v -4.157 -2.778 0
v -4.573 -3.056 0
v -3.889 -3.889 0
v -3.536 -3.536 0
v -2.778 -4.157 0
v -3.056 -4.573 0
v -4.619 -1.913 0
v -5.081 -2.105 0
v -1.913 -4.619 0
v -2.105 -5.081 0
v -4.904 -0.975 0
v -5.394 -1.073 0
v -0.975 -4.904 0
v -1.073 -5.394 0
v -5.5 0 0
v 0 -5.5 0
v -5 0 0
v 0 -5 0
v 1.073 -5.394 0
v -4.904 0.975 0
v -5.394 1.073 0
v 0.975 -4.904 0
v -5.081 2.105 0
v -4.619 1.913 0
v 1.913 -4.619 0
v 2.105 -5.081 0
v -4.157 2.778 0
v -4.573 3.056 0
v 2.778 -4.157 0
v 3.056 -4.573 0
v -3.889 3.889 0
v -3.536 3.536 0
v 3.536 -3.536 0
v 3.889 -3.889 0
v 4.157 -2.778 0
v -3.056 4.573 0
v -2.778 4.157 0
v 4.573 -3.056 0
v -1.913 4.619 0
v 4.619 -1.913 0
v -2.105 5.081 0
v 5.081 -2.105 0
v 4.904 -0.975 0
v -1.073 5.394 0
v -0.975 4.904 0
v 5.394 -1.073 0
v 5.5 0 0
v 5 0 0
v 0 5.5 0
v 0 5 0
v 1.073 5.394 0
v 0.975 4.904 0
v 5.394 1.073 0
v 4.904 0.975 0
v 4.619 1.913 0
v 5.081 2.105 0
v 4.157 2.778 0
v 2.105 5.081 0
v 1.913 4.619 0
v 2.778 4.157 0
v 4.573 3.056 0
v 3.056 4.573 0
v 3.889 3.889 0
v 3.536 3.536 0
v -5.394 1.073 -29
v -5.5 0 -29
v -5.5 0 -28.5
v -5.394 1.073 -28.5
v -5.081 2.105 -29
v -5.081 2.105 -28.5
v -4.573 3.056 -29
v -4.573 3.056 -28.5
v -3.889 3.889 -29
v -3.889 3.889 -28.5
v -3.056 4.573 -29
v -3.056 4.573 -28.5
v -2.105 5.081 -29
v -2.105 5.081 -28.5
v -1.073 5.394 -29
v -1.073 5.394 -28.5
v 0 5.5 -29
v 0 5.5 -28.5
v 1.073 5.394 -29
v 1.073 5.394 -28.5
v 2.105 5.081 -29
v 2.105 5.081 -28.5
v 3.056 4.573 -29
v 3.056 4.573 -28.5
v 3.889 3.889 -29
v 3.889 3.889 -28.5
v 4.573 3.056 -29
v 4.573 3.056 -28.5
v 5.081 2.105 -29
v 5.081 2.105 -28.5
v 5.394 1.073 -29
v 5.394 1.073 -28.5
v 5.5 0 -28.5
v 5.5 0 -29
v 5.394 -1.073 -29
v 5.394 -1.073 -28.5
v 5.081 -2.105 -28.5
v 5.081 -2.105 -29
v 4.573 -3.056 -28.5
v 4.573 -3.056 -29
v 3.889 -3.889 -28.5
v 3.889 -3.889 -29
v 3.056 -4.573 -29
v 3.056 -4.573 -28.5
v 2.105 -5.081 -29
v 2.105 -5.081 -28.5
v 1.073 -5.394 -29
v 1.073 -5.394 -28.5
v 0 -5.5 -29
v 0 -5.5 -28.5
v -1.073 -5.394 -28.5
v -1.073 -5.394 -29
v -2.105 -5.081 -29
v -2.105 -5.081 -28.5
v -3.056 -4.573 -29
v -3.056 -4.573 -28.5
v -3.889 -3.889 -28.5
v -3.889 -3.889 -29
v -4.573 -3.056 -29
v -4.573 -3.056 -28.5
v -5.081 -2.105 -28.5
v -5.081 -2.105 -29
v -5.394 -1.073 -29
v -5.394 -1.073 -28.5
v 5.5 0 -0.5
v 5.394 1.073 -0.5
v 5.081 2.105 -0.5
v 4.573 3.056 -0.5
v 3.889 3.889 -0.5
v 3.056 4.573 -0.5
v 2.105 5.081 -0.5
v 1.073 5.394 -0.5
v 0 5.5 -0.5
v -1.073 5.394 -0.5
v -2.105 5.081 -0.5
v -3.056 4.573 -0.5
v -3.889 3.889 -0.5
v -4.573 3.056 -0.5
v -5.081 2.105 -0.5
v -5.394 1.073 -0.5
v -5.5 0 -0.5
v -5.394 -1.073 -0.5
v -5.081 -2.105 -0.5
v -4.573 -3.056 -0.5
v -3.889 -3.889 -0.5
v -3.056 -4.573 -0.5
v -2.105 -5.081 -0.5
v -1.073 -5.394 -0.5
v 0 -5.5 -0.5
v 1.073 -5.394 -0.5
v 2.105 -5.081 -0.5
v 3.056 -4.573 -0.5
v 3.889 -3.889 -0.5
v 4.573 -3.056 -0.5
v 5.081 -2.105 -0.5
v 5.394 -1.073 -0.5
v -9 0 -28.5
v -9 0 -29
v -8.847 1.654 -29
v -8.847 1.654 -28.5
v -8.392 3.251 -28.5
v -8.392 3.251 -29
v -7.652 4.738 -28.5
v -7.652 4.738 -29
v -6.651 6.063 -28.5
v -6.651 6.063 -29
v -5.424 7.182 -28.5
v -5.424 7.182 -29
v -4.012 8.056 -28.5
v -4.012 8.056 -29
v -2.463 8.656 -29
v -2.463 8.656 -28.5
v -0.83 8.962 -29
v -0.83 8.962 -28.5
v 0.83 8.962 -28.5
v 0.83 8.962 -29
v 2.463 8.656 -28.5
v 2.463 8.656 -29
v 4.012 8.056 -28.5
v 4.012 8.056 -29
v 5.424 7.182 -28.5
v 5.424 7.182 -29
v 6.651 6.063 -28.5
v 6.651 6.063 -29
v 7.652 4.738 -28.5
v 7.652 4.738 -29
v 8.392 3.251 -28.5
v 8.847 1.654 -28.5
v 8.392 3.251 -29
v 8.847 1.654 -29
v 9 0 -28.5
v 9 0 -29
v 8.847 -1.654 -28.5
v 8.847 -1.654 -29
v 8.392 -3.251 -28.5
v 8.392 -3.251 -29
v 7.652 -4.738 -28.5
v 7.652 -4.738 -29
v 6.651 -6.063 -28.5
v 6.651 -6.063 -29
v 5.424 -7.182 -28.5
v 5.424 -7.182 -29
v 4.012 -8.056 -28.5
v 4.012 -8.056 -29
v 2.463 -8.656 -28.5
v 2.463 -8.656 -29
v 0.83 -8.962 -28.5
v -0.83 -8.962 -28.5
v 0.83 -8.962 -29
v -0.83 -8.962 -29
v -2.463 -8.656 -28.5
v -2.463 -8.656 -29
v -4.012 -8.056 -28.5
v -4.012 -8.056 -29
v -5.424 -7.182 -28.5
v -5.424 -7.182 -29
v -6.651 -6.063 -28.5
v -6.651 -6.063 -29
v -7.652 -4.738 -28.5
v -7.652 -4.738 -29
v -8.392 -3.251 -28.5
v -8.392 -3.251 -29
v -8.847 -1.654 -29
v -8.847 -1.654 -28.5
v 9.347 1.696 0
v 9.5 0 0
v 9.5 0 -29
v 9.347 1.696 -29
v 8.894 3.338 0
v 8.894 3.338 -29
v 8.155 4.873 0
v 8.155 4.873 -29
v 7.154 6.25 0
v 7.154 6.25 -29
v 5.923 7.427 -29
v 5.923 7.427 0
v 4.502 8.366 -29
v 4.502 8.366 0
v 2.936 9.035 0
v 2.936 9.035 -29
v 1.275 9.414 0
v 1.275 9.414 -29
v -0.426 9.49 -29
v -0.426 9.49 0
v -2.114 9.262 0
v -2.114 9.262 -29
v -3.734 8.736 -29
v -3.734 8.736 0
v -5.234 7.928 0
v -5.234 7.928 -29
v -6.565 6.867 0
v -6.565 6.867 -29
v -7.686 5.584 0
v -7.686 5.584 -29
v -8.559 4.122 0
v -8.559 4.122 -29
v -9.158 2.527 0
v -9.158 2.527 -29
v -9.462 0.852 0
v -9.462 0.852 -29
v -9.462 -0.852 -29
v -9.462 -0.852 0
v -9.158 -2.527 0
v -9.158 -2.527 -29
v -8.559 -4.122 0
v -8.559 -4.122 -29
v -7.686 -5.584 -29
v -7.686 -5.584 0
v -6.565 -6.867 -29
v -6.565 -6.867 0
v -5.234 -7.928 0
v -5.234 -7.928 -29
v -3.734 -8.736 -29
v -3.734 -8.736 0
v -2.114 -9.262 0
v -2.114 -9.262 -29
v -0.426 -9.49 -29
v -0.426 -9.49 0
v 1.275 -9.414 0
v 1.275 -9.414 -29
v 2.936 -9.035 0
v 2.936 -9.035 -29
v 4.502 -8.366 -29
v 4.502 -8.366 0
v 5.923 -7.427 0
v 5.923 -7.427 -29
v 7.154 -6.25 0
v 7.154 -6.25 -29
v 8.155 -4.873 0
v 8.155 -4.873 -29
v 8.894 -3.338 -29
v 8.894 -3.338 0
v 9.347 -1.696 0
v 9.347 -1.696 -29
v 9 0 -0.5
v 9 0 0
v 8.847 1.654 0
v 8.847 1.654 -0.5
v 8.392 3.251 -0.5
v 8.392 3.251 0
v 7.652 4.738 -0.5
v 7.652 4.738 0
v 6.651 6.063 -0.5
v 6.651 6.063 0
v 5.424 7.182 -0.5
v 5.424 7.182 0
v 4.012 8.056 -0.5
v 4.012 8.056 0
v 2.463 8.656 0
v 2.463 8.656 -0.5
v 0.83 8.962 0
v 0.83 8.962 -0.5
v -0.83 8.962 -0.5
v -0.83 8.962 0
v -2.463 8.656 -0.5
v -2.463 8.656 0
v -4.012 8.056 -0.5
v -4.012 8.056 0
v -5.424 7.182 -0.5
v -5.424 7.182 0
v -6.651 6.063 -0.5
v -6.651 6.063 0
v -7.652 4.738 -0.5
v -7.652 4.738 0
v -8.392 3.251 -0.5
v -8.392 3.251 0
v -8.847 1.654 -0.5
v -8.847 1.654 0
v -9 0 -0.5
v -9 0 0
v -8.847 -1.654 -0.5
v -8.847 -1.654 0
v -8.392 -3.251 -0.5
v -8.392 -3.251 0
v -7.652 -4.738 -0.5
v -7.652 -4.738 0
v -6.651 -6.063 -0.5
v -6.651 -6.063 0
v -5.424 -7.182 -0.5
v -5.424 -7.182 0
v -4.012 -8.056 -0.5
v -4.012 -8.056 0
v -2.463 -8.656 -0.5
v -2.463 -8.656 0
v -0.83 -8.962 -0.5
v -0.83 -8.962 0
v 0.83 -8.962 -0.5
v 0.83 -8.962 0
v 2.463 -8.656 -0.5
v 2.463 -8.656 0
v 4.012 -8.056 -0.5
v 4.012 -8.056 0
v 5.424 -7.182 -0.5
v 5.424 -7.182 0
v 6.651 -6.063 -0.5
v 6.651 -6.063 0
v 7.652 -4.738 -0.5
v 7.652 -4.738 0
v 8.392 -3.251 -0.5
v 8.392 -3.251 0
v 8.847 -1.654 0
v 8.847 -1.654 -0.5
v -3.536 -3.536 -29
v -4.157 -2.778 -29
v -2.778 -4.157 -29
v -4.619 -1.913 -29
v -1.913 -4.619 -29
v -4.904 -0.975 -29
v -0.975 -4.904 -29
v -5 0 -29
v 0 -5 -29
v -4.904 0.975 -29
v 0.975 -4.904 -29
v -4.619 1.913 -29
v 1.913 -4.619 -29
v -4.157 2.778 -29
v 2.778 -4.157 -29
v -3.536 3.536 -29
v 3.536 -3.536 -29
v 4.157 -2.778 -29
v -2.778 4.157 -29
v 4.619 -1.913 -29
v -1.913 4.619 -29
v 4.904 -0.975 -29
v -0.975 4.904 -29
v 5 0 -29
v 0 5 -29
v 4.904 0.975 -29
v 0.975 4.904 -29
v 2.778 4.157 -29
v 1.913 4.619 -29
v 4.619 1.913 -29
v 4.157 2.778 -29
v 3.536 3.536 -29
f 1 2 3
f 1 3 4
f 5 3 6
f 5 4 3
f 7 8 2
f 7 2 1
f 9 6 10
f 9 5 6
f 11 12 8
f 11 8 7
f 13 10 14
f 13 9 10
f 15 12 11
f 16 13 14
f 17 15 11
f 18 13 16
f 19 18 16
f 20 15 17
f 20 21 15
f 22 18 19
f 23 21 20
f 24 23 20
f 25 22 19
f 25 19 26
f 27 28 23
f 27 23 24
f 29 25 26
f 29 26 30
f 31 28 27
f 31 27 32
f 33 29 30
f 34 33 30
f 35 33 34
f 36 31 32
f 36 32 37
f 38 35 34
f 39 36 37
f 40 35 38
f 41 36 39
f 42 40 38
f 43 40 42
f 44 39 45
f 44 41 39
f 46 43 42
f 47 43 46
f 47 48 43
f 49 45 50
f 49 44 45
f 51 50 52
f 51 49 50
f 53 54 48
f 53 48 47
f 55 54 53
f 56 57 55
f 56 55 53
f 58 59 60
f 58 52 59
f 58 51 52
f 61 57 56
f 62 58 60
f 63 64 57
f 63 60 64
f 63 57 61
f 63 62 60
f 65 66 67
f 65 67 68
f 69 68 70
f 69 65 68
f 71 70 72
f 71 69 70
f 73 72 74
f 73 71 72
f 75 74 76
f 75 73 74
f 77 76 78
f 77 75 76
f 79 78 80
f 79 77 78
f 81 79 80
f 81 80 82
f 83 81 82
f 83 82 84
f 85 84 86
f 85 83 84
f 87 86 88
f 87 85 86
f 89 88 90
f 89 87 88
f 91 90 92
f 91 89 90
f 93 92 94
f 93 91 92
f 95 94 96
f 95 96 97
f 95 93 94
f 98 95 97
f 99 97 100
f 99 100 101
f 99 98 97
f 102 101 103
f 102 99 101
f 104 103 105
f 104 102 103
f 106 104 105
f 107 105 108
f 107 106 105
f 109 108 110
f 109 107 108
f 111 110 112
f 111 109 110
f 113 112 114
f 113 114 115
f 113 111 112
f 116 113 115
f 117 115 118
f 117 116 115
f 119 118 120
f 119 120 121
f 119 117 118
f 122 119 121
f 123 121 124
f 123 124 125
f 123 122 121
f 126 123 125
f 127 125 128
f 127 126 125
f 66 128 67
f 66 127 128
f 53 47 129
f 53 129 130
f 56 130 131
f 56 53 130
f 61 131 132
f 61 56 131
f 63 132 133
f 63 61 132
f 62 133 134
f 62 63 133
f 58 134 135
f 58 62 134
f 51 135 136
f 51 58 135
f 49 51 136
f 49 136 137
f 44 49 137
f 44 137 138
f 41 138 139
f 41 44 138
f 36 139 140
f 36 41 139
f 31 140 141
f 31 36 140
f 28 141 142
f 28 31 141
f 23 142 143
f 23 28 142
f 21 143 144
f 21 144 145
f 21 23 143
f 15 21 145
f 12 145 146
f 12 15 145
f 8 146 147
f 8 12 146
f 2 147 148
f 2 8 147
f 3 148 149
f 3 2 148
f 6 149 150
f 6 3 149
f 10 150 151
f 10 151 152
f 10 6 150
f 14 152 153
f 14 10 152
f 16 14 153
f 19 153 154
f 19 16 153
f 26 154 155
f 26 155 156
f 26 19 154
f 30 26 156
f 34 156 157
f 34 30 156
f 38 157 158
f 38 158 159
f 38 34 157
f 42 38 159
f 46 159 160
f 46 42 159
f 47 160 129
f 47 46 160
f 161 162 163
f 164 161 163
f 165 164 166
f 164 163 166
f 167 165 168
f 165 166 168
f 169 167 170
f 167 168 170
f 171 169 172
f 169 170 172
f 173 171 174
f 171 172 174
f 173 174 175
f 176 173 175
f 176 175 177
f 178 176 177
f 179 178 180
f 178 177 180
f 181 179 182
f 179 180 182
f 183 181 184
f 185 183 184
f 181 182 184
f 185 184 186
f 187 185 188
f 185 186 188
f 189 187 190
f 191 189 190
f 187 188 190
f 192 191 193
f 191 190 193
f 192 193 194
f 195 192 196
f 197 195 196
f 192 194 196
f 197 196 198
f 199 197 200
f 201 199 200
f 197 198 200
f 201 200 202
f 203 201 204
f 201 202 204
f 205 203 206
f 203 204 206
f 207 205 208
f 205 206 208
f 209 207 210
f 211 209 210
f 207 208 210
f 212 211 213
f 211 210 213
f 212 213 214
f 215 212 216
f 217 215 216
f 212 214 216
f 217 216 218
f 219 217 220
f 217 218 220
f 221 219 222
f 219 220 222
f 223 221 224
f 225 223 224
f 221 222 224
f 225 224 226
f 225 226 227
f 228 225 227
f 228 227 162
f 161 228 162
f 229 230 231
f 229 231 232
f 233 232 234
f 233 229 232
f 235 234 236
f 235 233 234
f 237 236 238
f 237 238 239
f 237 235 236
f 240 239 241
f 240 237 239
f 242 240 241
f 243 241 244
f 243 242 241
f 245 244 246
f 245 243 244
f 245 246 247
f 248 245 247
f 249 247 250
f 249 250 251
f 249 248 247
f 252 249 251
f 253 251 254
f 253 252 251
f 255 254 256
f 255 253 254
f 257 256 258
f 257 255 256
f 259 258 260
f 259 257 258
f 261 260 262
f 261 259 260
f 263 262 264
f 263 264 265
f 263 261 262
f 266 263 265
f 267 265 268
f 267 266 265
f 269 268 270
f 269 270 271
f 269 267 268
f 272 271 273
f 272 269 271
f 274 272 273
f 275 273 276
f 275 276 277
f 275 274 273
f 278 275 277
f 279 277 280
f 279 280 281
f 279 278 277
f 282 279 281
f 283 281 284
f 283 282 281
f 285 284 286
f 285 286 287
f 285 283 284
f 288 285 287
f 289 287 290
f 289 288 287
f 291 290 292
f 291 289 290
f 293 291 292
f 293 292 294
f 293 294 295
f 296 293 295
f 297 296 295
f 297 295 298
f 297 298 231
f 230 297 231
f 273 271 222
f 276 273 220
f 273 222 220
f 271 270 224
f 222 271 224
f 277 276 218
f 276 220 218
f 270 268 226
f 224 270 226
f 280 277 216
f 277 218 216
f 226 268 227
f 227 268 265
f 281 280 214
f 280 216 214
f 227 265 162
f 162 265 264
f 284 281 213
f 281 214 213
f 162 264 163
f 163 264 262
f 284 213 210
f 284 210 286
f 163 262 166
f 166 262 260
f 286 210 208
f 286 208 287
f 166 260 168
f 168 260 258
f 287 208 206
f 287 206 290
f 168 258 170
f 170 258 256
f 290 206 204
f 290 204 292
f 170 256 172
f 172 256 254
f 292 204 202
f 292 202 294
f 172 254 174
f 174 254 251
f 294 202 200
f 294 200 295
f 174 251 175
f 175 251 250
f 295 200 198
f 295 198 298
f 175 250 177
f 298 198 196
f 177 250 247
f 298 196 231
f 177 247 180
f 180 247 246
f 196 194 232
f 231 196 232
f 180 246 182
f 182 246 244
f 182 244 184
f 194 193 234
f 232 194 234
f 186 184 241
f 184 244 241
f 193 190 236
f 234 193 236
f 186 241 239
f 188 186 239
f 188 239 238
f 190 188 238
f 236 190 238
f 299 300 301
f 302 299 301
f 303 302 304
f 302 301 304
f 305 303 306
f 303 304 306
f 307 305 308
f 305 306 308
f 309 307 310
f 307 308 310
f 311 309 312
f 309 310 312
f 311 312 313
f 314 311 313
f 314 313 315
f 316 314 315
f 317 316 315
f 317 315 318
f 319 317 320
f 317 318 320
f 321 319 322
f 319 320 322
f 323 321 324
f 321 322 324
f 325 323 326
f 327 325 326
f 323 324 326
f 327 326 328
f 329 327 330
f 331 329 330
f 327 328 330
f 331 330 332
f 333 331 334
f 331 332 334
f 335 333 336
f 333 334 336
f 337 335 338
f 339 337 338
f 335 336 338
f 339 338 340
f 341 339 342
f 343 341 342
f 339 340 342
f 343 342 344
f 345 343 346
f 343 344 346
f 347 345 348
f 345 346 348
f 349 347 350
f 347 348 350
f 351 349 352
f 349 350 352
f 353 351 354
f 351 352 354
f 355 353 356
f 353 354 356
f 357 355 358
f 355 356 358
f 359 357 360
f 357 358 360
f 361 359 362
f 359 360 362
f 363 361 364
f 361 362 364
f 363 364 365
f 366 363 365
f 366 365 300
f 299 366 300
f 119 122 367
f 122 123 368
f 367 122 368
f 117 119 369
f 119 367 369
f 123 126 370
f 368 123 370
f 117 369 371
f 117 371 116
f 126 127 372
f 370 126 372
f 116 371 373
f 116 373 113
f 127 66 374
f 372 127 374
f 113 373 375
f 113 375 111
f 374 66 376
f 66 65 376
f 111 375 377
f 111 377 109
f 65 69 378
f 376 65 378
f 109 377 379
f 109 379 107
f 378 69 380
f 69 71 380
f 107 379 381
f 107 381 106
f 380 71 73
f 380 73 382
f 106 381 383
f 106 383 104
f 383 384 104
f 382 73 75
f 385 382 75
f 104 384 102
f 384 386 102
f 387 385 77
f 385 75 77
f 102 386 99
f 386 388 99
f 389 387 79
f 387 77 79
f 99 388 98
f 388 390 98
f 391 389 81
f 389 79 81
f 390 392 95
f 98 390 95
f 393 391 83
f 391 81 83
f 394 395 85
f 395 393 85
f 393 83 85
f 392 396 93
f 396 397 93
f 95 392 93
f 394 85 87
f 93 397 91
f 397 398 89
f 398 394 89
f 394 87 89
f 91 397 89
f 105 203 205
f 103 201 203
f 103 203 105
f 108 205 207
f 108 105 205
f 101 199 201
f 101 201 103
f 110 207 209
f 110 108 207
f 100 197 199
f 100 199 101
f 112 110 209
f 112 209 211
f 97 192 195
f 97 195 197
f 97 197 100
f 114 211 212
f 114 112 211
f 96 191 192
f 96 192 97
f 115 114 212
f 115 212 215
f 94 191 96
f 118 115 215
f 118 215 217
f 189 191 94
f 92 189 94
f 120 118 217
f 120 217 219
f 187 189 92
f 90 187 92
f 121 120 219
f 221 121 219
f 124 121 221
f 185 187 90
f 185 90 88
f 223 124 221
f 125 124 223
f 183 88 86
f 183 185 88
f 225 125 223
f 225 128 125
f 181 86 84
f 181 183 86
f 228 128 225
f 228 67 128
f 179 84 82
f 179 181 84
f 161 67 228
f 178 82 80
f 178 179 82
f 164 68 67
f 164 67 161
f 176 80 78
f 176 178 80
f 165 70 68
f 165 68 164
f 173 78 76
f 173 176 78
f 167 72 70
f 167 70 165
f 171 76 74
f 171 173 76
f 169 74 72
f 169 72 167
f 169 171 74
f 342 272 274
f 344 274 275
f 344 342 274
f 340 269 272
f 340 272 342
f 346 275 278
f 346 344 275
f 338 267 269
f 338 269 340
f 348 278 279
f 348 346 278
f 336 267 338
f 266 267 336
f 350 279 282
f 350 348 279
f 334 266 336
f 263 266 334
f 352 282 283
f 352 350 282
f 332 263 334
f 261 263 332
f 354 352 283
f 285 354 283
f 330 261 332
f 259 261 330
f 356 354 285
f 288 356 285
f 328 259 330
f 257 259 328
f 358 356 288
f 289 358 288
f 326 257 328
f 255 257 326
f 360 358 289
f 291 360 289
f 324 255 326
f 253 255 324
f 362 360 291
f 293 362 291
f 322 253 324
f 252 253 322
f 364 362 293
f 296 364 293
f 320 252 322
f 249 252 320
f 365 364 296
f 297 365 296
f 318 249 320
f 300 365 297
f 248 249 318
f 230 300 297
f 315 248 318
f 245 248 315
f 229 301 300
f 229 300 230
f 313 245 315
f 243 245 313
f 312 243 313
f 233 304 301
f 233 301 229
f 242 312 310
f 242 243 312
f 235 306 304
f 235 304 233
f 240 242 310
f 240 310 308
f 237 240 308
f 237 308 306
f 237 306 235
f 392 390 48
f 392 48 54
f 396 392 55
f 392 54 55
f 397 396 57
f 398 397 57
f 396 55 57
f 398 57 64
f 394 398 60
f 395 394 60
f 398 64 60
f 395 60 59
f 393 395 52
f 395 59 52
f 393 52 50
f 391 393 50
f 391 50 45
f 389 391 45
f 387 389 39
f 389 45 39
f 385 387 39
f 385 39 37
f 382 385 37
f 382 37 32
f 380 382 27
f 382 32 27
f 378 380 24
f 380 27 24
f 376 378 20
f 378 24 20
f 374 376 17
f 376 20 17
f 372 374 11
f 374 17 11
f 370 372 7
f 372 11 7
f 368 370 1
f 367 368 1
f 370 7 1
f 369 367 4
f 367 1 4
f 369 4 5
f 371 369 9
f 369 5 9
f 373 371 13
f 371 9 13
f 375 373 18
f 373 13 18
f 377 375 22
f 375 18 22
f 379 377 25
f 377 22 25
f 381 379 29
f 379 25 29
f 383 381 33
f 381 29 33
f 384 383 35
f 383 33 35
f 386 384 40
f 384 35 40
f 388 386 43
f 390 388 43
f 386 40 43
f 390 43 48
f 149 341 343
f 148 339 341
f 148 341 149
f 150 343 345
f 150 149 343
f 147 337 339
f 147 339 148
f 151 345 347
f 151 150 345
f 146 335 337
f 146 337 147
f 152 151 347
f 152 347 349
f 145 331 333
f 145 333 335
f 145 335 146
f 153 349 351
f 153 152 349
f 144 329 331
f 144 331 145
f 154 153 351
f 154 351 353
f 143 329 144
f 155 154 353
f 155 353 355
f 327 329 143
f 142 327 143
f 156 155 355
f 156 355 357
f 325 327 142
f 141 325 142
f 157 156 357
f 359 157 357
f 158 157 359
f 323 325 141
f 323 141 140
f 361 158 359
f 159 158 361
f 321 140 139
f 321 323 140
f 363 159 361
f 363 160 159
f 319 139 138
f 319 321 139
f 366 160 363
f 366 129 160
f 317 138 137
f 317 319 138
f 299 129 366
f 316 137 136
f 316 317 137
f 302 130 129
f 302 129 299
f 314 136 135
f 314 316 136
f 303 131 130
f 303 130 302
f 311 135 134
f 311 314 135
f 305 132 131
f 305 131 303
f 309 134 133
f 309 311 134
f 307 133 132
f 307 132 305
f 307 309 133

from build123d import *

# Parameters (mm, degrees)
SKIZZE1_R                       = 9.5
SKIZZE1_R_2                     = 5
AUFSATZ_LINEAR_AUSTRAGEN1_DEPTH = 29
SKIZZE2_R                       = 9
SKIZZE2_R_2                     = 5.5
SCHNITT_LINEAR_AUSTRAGEN1_DEPTH = 0.5
SKIZZE3_R                       = 9
SKIZZE3_R_2                     = 5.5
SCHNITT_LINEAR_AUSTRAGEN2_DEPTH = 0.5


with BuildPart() as part:
    # Skizze1 → Aufsatz-Linear austragen1 (new body)
    with BuildSketch(Plane.XY):
        Circle(SKIZZE1_R)
        Circle(SKIZZE1_R_2, mode=Mode.SUBTRACT)
    extrude(amount=-AUFSATZ_LINEAR_AUSTRAGEN1_DEPTH)

    # Skizze2 → Schnitt-Linear austragen1 (cut)
    with BuildSketch(Plane.XY):
        Circle(SKIZZE2_R)
        Circle(SKIZZE2_R_2, mode=Mode.SUBTRACT)
    extrude(amount=-SCHNITT_LINEAR_AUSTRAGEN1_DEPTH, mode=Mode.SUBTRACT)

    # Skizze3 → Schnitt-Linear austragen2 (cut)
    with BuildSketch(Plane(origin=(0, 0, -29), x_dir=(-1, 0, 0), z_dir=(0, 0, -1))):
        Circle(SKIZZE3_R)
        Circle(SKIZZE3_R_2, mode=Mode.SUBTRACT)
    extrude(amount=-SCHNITT_LINEAR_AUSTRAGEN2_DEPTH, mode=Mode.SUBTRACT)


solid = part.part
